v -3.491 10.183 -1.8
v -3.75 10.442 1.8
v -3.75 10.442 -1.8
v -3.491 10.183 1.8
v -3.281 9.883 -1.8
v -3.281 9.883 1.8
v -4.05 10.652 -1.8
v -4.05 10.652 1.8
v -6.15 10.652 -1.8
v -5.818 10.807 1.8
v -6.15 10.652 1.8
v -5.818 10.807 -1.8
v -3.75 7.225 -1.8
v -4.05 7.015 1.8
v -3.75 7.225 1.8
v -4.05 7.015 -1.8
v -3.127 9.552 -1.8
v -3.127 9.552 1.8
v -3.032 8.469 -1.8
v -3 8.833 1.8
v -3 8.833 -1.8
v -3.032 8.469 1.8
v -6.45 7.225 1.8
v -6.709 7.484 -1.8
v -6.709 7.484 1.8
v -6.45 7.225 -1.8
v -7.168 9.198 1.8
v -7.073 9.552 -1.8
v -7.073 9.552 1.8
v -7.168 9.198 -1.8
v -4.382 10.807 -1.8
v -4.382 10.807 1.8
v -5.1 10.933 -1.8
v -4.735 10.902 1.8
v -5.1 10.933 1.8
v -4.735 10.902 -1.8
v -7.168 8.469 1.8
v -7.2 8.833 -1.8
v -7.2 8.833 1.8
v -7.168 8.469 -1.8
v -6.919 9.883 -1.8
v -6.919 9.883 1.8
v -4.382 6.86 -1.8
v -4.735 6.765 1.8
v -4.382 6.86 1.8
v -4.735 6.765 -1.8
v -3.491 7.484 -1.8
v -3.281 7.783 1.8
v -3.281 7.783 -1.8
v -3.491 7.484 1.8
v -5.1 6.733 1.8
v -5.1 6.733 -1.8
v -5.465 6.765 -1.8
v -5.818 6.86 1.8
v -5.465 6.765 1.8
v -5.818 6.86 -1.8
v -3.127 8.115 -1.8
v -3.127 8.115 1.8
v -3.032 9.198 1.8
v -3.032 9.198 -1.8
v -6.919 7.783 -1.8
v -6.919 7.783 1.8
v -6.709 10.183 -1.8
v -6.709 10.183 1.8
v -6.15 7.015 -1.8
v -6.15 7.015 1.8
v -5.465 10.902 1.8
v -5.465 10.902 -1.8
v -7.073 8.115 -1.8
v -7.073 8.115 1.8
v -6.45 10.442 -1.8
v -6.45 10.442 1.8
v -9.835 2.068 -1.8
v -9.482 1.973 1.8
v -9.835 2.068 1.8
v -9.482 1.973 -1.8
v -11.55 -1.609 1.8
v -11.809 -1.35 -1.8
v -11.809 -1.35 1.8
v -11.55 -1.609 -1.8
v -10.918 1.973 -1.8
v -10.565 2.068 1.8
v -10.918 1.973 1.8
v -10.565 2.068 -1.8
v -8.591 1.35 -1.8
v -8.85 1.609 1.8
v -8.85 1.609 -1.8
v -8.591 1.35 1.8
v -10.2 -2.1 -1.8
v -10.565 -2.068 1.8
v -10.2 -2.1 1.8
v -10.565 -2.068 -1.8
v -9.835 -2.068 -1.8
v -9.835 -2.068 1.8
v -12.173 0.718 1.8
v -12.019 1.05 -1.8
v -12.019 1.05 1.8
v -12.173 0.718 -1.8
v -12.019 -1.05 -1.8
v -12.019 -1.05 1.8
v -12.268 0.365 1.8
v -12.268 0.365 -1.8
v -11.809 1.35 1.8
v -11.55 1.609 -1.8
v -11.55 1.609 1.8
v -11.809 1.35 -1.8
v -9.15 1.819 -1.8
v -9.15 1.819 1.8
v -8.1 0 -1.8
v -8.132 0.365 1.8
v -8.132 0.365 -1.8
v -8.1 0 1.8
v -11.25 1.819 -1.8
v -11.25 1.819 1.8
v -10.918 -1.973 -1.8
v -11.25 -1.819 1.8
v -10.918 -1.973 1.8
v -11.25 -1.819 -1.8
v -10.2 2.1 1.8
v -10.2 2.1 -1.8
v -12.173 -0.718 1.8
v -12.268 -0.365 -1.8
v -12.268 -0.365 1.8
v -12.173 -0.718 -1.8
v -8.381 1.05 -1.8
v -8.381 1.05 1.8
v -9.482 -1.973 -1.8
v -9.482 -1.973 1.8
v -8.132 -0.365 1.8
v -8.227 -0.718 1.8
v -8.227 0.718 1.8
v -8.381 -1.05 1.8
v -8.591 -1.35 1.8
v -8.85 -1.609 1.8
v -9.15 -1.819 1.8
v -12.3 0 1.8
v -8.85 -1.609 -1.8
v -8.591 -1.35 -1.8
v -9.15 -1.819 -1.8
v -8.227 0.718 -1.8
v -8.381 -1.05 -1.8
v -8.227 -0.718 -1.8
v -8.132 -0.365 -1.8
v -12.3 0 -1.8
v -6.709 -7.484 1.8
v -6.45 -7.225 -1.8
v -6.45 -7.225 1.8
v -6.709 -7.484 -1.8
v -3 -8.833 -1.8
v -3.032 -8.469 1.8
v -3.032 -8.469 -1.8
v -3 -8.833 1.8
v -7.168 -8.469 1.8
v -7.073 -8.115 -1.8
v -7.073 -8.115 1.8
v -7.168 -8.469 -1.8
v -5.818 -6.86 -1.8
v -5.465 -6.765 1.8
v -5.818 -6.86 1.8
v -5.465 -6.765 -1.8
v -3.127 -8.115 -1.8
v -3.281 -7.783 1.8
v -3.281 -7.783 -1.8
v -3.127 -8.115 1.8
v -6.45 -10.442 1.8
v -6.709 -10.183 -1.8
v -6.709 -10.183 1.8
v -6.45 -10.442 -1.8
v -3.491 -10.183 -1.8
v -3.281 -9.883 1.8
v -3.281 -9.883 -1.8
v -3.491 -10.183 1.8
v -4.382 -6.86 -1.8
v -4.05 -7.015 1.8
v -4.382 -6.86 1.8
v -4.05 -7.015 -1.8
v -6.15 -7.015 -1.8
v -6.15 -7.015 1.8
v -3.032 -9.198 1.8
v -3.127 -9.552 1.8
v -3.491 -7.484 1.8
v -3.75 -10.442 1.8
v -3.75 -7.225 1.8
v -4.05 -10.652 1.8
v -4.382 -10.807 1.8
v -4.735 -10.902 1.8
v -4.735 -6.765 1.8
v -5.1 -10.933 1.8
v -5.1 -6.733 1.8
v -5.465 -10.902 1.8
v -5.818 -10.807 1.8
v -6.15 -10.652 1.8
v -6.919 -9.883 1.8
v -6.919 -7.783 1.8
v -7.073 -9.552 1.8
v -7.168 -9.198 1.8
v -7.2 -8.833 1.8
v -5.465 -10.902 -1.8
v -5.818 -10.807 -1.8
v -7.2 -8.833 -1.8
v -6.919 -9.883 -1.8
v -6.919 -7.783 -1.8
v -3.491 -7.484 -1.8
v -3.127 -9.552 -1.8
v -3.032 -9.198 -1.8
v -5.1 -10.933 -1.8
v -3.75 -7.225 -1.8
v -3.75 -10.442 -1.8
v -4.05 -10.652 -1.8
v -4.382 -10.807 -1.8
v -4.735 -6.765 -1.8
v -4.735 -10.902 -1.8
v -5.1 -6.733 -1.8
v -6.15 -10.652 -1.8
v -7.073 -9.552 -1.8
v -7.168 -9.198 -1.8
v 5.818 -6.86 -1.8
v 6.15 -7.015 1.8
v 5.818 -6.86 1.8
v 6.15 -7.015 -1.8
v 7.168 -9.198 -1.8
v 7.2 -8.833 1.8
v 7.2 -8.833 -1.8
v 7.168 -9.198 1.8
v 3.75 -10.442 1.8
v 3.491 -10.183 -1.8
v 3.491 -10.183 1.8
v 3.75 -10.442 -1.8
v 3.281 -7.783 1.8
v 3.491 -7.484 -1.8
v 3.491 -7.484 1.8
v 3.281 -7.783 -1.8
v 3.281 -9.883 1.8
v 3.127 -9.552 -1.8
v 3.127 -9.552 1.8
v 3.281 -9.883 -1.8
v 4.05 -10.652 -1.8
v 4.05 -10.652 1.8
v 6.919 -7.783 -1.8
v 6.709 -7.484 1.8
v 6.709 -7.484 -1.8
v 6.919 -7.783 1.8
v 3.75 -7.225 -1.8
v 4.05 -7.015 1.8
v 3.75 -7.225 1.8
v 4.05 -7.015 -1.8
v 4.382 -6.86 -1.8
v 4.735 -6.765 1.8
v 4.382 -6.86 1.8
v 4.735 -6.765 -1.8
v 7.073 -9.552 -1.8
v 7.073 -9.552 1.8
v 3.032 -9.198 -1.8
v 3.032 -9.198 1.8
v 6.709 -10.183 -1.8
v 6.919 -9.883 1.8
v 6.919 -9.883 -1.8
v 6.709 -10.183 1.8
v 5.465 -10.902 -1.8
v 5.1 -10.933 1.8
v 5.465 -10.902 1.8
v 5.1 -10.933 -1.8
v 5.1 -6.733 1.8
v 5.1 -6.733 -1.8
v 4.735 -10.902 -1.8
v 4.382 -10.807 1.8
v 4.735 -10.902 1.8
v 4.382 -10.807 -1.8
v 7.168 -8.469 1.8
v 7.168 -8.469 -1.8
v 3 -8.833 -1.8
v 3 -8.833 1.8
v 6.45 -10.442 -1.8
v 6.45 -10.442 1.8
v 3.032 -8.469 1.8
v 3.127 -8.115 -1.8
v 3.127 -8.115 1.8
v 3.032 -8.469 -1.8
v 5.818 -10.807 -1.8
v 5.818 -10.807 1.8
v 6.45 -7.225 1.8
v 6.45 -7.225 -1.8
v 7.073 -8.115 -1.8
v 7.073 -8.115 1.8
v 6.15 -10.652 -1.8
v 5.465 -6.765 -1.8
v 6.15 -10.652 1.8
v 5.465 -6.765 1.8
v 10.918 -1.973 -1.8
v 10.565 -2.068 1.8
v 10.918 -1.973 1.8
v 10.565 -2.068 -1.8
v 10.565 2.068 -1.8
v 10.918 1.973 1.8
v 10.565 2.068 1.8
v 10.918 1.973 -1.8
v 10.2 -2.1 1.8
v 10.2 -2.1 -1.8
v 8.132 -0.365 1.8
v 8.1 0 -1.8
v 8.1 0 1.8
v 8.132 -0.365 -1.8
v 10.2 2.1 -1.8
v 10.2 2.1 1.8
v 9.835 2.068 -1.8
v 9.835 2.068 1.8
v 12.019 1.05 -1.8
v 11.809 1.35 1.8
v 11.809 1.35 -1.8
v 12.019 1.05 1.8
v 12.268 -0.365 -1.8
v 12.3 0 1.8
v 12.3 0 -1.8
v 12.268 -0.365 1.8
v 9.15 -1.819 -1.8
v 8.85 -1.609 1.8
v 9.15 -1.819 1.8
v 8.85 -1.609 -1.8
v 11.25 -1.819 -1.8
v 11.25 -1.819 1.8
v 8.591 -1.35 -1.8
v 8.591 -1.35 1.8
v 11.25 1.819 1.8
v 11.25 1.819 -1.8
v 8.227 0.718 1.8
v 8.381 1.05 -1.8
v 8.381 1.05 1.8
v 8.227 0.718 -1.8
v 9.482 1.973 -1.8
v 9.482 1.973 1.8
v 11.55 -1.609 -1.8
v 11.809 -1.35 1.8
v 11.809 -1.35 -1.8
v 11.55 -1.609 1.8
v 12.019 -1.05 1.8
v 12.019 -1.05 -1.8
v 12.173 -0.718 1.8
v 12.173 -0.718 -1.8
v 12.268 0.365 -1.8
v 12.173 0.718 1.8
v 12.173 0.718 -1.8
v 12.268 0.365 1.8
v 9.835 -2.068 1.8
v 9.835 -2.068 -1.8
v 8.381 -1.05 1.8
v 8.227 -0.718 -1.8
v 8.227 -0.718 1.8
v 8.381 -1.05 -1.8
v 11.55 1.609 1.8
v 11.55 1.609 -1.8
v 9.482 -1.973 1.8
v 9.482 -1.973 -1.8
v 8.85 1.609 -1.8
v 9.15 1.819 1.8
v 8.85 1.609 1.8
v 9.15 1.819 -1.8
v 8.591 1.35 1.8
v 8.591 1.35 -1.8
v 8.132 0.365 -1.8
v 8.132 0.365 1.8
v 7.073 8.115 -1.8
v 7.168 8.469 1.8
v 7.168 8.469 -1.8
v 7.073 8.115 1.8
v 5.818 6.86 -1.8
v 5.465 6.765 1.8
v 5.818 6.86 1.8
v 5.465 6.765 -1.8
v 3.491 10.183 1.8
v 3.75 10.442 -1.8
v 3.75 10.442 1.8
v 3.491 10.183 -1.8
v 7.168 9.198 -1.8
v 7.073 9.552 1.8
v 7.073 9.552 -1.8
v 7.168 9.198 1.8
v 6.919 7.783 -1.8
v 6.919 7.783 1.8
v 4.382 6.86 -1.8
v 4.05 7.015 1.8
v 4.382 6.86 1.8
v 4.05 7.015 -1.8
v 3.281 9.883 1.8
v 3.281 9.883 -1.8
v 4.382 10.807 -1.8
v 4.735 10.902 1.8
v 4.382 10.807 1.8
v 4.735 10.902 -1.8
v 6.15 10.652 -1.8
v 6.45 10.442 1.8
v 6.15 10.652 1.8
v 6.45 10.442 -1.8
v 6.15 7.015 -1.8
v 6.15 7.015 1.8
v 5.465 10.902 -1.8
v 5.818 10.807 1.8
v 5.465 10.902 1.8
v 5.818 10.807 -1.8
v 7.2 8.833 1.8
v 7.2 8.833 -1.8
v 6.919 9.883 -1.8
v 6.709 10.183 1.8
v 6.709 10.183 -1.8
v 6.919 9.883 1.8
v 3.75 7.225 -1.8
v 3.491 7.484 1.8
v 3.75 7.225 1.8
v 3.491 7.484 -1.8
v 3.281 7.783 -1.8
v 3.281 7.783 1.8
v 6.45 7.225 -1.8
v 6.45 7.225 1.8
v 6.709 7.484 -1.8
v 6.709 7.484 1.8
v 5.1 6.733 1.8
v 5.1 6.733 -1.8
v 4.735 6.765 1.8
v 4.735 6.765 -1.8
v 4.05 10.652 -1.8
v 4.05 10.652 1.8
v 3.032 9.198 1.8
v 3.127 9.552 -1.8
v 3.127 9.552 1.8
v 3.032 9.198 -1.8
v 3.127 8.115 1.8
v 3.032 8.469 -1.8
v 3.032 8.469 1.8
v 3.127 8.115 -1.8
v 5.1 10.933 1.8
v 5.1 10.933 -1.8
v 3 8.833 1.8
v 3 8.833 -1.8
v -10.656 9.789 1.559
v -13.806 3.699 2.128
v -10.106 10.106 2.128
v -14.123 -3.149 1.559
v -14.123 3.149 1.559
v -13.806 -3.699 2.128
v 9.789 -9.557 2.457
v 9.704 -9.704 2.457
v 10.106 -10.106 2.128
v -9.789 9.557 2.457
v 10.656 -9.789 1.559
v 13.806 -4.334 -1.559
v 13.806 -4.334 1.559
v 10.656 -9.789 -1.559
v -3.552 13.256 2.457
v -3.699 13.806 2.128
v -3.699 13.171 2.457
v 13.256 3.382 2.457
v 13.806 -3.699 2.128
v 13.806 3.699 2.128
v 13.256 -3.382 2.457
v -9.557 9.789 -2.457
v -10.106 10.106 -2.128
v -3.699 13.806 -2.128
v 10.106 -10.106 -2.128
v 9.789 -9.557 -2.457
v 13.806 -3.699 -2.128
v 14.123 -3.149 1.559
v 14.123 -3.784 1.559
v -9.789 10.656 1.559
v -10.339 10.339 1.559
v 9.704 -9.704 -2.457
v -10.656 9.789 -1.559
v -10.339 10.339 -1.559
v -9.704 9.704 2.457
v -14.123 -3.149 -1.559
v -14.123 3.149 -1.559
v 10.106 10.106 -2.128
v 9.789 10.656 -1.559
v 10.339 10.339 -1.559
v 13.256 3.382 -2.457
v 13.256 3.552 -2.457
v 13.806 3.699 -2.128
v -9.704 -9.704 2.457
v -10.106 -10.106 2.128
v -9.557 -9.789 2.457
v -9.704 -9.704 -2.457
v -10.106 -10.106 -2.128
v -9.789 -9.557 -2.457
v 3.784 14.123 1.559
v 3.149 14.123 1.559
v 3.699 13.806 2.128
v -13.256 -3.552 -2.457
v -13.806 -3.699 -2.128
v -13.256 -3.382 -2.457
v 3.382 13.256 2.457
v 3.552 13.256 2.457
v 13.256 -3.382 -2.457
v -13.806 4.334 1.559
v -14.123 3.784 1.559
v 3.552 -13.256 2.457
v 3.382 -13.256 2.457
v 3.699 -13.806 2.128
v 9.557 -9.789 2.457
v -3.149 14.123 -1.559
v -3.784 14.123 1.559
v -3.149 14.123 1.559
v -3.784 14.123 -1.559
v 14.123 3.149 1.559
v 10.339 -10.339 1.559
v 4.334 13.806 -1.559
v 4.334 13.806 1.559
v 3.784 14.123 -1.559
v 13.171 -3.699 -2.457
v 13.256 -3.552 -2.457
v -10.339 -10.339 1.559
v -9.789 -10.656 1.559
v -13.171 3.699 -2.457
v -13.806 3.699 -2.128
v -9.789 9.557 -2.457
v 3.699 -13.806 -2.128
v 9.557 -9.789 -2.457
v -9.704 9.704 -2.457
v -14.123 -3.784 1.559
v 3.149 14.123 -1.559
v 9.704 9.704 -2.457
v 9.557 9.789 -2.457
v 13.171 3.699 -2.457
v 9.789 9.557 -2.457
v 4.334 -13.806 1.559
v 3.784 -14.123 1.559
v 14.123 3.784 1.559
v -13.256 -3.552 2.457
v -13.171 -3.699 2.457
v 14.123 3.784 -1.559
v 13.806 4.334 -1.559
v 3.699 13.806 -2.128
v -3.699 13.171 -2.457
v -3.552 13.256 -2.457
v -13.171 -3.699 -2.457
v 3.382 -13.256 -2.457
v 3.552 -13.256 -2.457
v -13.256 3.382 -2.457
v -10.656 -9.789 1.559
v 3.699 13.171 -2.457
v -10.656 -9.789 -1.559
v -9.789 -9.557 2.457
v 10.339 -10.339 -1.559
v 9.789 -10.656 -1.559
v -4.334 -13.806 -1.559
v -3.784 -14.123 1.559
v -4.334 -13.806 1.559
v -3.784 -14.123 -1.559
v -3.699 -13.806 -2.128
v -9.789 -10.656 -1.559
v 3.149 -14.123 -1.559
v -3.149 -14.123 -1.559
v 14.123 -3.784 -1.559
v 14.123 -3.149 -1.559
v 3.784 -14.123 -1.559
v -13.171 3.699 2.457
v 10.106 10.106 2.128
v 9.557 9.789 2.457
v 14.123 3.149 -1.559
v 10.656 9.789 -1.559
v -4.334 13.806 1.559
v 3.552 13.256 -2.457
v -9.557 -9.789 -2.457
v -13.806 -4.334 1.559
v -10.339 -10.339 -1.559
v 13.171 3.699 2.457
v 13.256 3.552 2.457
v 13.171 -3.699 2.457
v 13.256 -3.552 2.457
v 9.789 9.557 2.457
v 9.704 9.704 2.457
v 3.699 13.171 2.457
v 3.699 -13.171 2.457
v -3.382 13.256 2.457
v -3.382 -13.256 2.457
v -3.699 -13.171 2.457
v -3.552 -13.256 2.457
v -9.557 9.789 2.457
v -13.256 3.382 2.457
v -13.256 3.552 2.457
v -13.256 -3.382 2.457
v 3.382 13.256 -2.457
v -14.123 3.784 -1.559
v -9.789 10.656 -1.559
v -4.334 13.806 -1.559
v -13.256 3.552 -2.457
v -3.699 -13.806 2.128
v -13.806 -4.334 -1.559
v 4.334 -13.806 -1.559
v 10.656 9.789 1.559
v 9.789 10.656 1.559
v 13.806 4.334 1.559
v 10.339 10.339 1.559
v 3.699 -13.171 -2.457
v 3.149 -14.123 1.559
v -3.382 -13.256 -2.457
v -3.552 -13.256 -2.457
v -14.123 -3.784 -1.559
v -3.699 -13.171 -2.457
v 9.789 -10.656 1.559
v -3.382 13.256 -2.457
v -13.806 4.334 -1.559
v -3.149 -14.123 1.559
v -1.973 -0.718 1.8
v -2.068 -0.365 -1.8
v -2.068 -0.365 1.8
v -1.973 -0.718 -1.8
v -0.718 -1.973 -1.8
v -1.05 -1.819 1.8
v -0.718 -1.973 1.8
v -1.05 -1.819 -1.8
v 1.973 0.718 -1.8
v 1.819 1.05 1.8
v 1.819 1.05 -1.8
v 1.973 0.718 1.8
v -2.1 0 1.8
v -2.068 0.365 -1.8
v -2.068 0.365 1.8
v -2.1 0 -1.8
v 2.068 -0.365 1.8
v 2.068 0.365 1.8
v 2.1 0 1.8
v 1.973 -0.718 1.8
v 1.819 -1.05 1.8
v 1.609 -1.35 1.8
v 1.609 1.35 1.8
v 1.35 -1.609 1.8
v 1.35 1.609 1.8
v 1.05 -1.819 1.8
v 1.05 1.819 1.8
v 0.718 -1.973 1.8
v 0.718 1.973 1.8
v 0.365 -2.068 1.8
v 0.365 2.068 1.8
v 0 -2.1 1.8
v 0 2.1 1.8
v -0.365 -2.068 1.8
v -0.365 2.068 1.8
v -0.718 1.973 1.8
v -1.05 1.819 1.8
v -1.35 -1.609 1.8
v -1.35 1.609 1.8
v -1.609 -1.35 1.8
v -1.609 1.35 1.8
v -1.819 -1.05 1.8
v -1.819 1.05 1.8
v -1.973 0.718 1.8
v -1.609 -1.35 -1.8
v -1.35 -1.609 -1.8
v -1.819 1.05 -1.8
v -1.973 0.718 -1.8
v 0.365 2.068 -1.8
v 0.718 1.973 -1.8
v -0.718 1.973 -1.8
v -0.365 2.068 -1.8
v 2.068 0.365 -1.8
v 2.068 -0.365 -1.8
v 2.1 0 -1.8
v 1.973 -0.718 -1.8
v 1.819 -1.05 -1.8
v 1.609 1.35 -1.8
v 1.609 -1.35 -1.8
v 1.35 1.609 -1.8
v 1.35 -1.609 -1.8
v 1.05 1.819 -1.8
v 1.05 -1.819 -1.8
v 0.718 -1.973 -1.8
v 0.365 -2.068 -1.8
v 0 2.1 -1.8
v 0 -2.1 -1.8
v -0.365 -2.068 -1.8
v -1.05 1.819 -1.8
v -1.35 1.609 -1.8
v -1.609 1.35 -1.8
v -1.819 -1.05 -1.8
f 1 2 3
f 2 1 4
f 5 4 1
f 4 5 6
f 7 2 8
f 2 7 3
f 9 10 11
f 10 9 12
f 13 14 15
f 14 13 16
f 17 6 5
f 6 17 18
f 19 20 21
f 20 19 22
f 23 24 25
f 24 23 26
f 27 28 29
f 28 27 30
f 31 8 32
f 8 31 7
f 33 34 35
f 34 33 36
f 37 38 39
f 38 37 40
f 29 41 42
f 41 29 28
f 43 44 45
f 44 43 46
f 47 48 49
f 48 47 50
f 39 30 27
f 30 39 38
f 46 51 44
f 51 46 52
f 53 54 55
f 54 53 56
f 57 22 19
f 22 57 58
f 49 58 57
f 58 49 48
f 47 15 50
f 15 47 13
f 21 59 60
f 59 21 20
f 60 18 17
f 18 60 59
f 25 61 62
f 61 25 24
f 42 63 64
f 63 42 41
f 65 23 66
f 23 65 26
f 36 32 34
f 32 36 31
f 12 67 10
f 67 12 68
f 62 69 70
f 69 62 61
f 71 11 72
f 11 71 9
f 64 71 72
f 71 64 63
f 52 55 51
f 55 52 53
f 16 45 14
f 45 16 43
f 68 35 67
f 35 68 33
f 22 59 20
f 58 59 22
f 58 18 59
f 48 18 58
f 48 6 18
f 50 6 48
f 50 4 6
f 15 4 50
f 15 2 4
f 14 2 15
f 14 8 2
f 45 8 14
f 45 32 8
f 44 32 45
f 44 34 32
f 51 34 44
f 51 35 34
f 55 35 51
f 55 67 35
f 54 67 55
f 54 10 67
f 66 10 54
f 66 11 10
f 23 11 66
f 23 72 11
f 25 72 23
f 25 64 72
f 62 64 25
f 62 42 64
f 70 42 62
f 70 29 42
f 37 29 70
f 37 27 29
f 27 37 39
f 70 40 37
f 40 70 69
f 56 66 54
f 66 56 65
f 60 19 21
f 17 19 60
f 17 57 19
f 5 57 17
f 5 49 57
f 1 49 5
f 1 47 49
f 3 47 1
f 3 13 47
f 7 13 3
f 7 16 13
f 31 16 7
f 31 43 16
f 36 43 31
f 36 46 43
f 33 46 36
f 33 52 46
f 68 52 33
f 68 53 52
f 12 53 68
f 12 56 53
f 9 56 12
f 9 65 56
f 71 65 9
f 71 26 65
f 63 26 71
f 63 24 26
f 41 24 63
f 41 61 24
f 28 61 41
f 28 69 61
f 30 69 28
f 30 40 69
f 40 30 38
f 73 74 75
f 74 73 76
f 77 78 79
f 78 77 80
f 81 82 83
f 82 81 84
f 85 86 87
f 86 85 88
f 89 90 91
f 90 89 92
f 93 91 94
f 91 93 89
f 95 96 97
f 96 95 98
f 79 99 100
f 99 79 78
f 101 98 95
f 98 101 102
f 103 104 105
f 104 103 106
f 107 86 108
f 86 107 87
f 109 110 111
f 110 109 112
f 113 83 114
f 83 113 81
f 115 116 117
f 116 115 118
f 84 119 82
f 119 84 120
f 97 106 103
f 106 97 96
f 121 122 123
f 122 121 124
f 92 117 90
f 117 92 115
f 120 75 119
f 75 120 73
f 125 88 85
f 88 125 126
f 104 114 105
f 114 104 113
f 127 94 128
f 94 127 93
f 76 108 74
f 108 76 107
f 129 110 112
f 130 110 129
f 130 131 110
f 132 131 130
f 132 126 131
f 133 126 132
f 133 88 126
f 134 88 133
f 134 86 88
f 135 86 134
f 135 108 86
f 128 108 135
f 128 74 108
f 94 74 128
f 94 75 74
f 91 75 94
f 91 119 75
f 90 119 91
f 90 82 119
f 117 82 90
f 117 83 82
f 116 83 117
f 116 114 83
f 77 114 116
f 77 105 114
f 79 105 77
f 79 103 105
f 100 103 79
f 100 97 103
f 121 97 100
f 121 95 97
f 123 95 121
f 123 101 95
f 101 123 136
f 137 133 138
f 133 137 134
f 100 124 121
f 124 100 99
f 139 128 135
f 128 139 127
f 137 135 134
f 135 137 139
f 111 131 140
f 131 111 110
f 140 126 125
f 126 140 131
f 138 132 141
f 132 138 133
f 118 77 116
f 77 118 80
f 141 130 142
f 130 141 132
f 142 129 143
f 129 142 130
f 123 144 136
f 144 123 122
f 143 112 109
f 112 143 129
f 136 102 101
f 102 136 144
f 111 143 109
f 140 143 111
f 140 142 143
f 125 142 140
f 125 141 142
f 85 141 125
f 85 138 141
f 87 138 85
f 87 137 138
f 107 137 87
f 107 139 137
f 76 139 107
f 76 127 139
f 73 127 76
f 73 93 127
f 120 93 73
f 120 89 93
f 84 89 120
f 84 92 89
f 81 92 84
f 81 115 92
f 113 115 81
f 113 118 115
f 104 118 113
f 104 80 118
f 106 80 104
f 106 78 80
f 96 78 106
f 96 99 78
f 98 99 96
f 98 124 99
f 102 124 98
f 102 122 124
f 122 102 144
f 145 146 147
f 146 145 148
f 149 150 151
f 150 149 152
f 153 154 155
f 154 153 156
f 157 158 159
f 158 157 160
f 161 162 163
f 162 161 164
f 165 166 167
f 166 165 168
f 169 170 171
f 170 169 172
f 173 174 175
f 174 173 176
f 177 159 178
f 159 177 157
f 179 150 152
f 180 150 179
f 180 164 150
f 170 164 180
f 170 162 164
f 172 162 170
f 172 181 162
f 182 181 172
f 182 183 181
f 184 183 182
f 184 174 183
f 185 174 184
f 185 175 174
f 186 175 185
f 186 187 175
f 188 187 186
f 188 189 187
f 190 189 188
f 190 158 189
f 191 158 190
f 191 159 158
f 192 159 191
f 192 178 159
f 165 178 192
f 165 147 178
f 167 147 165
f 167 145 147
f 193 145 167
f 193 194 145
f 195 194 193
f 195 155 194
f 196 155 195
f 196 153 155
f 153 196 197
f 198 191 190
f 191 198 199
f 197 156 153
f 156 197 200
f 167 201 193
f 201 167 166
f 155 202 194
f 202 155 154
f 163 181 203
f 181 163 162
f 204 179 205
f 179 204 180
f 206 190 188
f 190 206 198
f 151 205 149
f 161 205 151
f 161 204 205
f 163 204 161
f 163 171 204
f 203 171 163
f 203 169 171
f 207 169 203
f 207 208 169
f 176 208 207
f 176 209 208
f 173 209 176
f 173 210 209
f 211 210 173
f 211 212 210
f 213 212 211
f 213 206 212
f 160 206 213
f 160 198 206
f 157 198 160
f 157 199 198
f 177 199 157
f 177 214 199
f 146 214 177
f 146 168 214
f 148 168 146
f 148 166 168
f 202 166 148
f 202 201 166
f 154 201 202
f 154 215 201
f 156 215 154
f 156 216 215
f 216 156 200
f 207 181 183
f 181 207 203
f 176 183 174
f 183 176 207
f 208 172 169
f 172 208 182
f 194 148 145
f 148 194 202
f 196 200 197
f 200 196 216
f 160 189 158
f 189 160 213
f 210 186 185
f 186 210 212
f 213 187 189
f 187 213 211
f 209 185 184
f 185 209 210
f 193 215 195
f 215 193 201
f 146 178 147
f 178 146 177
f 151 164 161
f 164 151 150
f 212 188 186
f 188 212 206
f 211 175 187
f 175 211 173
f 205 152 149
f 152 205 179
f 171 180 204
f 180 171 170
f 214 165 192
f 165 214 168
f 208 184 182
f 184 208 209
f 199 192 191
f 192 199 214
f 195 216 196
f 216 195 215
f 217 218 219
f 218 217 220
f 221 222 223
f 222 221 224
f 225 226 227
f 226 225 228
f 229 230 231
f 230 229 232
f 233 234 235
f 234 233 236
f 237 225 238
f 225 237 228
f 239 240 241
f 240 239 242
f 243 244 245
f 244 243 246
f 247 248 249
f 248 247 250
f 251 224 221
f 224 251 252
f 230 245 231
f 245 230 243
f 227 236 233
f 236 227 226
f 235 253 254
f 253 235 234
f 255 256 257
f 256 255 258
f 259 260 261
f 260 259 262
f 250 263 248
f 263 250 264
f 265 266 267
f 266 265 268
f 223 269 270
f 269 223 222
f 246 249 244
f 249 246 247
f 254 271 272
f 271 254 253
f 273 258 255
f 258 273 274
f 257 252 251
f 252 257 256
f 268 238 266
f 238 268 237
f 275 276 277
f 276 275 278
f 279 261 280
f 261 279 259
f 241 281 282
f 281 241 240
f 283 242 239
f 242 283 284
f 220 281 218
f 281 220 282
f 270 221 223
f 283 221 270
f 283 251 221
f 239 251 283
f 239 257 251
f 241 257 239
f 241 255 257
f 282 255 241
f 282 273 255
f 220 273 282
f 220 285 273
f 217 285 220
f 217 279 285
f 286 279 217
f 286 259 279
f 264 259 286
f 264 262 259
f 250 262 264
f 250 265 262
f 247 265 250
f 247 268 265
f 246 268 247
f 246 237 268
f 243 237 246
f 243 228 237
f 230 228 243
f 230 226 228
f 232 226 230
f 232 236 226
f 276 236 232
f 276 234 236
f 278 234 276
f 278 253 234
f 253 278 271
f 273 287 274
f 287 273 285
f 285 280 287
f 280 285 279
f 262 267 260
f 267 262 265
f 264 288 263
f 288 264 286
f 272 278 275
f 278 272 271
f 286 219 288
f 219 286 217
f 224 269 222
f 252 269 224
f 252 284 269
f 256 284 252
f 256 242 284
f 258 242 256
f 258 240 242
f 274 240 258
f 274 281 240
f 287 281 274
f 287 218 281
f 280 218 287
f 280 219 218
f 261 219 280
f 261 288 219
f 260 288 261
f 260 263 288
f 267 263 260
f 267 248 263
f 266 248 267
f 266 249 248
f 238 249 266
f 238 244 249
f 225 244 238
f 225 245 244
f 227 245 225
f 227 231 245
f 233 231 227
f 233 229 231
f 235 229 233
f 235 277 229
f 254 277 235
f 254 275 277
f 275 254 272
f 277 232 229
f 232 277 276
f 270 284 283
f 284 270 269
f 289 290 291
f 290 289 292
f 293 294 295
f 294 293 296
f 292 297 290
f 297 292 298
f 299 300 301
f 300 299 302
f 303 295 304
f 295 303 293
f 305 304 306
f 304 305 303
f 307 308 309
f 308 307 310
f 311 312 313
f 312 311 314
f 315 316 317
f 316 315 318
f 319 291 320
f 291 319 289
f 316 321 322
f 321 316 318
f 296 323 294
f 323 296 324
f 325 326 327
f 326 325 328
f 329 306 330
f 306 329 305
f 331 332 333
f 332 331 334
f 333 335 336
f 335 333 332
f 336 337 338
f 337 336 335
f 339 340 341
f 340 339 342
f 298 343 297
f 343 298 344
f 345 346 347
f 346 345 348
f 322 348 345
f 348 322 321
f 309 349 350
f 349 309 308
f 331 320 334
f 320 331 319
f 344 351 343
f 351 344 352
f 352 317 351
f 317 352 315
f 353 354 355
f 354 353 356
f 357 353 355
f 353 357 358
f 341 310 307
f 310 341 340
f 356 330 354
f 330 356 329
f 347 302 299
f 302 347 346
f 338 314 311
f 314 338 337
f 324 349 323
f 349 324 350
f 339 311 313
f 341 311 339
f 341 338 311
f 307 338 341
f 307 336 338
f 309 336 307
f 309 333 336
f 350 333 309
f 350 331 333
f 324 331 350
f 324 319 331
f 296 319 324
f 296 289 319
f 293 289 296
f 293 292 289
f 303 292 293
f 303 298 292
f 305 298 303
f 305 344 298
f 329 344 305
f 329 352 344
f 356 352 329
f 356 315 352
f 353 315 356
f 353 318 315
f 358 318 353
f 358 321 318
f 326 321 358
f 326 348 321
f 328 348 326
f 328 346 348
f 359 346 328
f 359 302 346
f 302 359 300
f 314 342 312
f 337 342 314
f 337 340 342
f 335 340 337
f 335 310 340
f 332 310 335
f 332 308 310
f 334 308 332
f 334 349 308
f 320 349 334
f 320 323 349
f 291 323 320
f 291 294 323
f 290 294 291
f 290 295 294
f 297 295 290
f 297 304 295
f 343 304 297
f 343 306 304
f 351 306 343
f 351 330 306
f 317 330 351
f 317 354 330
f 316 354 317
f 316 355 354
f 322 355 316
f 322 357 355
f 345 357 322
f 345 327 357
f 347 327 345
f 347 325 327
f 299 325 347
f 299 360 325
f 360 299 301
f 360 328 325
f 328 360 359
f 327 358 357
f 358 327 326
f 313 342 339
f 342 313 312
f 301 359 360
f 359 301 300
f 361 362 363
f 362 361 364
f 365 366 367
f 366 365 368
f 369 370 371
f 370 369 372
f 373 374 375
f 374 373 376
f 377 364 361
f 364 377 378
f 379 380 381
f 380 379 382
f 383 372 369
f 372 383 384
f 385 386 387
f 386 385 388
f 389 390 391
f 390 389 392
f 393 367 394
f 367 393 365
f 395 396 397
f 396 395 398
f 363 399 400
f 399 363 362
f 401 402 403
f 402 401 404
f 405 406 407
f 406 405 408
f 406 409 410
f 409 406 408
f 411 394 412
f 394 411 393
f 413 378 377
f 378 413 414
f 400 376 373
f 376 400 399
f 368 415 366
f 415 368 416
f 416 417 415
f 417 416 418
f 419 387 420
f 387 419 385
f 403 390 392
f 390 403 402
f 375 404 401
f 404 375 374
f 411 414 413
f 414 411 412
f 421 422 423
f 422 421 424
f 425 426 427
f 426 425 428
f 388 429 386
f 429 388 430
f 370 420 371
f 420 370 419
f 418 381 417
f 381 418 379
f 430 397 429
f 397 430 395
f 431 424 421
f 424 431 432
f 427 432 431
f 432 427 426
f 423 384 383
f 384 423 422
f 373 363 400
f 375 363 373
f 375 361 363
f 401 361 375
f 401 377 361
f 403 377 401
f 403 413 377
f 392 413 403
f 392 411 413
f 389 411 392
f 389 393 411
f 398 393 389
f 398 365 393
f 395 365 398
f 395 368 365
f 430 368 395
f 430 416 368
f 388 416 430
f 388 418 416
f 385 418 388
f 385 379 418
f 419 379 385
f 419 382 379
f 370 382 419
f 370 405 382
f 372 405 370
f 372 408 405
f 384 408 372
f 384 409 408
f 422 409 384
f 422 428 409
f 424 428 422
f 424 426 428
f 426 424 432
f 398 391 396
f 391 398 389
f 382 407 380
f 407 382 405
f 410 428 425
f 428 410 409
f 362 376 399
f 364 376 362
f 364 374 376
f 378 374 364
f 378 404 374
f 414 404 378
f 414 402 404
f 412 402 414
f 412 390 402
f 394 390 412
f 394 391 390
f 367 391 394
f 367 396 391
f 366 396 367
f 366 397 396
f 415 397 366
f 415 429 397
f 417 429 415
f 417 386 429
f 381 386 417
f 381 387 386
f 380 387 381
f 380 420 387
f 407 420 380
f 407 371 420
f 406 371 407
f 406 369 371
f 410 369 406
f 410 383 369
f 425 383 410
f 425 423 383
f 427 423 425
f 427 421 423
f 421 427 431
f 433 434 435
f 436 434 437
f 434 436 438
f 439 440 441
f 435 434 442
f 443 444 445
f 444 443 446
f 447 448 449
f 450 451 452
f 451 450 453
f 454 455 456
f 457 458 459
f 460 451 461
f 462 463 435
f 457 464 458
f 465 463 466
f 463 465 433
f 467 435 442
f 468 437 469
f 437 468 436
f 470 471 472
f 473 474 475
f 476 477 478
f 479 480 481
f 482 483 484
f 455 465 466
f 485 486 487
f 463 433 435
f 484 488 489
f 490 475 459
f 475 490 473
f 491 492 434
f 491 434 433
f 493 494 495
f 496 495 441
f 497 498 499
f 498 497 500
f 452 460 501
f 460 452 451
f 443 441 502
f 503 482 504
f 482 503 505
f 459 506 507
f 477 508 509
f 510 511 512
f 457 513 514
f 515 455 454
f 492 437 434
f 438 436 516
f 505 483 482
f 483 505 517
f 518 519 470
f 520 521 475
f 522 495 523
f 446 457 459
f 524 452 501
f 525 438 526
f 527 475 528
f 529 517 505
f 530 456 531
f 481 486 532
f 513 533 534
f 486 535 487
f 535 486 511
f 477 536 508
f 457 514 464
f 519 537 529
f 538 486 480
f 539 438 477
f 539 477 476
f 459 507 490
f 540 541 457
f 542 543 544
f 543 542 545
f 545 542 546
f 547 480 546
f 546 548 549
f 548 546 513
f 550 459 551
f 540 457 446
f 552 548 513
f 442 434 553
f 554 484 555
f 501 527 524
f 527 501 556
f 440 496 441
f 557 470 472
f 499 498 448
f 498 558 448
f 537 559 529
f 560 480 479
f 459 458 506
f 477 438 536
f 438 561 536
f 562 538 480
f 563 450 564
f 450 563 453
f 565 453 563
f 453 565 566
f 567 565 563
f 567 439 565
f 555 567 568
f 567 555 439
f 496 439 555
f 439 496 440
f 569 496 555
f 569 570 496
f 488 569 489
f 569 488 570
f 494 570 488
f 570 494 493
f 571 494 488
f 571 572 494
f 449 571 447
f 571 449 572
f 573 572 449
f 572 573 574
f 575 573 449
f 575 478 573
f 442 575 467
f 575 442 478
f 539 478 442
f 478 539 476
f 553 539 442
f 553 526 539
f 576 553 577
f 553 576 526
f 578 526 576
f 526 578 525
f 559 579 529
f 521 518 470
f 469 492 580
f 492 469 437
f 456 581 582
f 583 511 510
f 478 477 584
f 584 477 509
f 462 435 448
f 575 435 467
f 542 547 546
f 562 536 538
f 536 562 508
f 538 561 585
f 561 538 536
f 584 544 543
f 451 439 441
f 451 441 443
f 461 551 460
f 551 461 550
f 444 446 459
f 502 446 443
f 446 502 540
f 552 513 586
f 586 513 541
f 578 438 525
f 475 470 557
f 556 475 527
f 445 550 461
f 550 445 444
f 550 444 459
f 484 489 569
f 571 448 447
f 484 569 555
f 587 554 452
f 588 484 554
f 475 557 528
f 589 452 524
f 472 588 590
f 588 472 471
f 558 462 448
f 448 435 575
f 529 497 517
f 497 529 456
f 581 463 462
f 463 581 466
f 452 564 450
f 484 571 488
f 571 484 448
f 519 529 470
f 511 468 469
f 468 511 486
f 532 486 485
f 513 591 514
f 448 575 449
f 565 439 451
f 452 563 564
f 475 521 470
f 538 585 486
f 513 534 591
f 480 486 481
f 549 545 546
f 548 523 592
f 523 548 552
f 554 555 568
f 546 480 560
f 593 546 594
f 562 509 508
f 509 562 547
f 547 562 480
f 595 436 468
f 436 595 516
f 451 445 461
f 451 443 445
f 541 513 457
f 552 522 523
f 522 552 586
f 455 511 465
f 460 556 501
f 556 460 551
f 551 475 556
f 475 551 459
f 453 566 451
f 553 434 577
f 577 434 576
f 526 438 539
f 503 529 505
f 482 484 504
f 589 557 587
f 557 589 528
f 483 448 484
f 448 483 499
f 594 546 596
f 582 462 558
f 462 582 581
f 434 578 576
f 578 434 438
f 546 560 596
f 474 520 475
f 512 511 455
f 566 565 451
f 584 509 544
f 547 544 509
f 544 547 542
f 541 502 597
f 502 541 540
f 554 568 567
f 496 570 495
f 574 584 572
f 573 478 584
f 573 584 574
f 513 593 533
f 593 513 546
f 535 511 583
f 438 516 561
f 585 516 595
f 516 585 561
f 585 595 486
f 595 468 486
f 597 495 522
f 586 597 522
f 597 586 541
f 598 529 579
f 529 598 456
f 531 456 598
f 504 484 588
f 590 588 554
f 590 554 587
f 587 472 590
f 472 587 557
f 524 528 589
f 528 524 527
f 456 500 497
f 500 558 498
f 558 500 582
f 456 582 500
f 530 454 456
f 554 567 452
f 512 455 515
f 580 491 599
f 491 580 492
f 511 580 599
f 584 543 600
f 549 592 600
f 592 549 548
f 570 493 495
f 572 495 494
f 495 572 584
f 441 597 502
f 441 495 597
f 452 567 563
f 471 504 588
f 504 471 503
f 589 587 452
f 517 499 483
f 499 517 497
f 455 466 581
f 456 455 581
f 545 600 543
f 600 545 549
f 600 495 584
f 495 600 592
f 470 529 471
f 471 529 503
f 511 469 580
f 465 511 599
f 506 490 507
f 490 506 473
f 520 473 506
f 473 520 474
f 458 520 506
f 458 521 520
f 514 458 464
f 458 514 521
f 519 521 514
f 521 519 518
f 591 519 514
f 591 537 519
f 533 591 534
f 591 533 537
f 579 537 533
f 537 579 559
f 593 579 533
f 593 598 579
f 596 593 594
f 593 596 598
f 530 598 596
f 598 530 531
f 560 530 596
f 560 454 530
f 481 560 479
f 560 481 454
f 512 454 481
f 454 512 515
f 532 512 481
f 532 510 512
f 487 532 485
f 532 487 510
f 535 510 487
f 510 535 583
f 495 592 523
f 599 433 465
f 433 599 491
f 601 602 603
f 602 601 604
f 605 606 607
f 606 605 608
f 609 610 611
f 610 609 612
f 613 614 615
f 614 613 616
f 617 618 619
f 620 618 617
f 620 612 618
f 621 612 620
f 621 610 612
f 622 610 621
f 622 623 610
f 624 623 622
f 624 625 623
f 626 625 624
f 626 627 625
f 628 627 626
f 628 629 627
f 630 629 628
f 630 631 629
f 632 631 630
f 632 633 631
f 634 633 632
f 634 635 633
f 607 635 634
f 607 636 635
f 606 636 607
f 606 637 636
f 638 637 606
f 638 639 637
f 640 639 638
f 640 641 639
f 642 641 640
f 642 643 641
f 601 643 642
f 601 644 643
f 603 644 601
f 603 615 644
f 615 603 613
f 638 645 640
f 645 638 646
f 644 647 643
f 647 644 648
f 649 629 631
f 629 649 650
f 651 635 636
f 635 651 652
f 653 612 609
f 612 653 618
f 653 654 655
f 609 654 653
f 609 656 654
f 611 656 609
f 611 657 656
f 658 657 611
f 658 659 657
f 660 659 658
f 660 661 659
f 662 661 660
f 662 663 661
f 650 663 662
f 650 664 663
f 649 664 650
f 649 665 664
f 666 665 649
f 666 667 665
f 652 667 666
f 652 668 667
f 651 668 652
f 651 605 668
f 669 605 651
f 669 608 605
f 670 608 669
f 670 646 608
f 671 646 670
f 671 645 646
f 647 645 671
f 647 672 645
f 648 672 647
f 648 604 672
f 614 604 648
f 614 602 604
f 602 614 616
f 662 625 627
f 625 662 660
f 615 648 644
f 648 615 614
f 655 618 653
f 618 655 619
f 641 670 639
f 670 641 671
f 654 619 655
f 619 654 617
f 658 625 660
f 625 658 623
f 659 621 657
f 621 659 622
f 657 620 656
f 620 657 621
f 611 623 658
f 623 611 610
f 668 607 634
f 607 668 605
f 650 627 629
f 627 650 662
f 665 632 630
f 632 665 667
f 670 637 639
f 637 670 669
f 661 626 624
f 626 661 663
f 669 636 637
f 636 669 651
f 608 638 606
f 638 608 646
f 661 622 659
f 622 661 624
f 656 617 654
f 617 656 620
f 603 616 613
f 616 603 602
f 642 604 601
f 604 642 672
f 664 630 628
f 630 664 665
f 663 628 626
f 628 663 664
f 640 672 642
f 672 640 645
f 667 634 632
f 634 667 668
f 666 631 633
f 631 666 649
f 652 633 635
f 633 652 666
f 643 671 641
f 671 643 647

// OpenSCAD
//
// token.scad
//

// unit is mm

inch = 25.4;
h = 5; // height unit, 5mm
o2 = 0.2;
//br = 3 / 2; // ball radius
br = 1.7;

r = inch / 2;
t = r / cos(30);
rr = r / 10;

echo(inch, r, t);

module sphe() { sphere(r=rr, $fn=12); }

module balcyl(deeper=false) {

  hf =
    is_num(deeper) ? deeper :
    deeper == true ? 2.8 :
    2;
  h = br * hf + o2;

  dz = hf > 2 ? -3 * o2 : 0;

  translate([ 0, 0, dz ])
    cylinder(r=br + 2 * o2, h=h, center=true, $fn=36);
}

module token(height=1) {

  hei = h * height;

  difference() {

    translate([ 0, 0, hei * -0.5 ])
      hull()
        for (a = [ 15 : 30 : 345 ]) {
          rotate([ 0, 0, a ]) {
            //translate([ 0, t - rr, 0 ]) cylinder(r=rr, h=h, $fn=12);
            translate([ 0, t - rr, hei - rr ]) sphe();
            translate([ 0, t - rr, rr ]) sphe();
          }
        }

    h0 = hei / 2 - h / 2;

    translate([ 0, 0, h0 ]) balcyl();

    for (a = [ 30 : 60 : 330 ]) {
      rotate([ 0, 0, a ])
        translate([ 0, r - br - 4 * o2, h0 ])
          balcyl();
    }
  }
}

token();
